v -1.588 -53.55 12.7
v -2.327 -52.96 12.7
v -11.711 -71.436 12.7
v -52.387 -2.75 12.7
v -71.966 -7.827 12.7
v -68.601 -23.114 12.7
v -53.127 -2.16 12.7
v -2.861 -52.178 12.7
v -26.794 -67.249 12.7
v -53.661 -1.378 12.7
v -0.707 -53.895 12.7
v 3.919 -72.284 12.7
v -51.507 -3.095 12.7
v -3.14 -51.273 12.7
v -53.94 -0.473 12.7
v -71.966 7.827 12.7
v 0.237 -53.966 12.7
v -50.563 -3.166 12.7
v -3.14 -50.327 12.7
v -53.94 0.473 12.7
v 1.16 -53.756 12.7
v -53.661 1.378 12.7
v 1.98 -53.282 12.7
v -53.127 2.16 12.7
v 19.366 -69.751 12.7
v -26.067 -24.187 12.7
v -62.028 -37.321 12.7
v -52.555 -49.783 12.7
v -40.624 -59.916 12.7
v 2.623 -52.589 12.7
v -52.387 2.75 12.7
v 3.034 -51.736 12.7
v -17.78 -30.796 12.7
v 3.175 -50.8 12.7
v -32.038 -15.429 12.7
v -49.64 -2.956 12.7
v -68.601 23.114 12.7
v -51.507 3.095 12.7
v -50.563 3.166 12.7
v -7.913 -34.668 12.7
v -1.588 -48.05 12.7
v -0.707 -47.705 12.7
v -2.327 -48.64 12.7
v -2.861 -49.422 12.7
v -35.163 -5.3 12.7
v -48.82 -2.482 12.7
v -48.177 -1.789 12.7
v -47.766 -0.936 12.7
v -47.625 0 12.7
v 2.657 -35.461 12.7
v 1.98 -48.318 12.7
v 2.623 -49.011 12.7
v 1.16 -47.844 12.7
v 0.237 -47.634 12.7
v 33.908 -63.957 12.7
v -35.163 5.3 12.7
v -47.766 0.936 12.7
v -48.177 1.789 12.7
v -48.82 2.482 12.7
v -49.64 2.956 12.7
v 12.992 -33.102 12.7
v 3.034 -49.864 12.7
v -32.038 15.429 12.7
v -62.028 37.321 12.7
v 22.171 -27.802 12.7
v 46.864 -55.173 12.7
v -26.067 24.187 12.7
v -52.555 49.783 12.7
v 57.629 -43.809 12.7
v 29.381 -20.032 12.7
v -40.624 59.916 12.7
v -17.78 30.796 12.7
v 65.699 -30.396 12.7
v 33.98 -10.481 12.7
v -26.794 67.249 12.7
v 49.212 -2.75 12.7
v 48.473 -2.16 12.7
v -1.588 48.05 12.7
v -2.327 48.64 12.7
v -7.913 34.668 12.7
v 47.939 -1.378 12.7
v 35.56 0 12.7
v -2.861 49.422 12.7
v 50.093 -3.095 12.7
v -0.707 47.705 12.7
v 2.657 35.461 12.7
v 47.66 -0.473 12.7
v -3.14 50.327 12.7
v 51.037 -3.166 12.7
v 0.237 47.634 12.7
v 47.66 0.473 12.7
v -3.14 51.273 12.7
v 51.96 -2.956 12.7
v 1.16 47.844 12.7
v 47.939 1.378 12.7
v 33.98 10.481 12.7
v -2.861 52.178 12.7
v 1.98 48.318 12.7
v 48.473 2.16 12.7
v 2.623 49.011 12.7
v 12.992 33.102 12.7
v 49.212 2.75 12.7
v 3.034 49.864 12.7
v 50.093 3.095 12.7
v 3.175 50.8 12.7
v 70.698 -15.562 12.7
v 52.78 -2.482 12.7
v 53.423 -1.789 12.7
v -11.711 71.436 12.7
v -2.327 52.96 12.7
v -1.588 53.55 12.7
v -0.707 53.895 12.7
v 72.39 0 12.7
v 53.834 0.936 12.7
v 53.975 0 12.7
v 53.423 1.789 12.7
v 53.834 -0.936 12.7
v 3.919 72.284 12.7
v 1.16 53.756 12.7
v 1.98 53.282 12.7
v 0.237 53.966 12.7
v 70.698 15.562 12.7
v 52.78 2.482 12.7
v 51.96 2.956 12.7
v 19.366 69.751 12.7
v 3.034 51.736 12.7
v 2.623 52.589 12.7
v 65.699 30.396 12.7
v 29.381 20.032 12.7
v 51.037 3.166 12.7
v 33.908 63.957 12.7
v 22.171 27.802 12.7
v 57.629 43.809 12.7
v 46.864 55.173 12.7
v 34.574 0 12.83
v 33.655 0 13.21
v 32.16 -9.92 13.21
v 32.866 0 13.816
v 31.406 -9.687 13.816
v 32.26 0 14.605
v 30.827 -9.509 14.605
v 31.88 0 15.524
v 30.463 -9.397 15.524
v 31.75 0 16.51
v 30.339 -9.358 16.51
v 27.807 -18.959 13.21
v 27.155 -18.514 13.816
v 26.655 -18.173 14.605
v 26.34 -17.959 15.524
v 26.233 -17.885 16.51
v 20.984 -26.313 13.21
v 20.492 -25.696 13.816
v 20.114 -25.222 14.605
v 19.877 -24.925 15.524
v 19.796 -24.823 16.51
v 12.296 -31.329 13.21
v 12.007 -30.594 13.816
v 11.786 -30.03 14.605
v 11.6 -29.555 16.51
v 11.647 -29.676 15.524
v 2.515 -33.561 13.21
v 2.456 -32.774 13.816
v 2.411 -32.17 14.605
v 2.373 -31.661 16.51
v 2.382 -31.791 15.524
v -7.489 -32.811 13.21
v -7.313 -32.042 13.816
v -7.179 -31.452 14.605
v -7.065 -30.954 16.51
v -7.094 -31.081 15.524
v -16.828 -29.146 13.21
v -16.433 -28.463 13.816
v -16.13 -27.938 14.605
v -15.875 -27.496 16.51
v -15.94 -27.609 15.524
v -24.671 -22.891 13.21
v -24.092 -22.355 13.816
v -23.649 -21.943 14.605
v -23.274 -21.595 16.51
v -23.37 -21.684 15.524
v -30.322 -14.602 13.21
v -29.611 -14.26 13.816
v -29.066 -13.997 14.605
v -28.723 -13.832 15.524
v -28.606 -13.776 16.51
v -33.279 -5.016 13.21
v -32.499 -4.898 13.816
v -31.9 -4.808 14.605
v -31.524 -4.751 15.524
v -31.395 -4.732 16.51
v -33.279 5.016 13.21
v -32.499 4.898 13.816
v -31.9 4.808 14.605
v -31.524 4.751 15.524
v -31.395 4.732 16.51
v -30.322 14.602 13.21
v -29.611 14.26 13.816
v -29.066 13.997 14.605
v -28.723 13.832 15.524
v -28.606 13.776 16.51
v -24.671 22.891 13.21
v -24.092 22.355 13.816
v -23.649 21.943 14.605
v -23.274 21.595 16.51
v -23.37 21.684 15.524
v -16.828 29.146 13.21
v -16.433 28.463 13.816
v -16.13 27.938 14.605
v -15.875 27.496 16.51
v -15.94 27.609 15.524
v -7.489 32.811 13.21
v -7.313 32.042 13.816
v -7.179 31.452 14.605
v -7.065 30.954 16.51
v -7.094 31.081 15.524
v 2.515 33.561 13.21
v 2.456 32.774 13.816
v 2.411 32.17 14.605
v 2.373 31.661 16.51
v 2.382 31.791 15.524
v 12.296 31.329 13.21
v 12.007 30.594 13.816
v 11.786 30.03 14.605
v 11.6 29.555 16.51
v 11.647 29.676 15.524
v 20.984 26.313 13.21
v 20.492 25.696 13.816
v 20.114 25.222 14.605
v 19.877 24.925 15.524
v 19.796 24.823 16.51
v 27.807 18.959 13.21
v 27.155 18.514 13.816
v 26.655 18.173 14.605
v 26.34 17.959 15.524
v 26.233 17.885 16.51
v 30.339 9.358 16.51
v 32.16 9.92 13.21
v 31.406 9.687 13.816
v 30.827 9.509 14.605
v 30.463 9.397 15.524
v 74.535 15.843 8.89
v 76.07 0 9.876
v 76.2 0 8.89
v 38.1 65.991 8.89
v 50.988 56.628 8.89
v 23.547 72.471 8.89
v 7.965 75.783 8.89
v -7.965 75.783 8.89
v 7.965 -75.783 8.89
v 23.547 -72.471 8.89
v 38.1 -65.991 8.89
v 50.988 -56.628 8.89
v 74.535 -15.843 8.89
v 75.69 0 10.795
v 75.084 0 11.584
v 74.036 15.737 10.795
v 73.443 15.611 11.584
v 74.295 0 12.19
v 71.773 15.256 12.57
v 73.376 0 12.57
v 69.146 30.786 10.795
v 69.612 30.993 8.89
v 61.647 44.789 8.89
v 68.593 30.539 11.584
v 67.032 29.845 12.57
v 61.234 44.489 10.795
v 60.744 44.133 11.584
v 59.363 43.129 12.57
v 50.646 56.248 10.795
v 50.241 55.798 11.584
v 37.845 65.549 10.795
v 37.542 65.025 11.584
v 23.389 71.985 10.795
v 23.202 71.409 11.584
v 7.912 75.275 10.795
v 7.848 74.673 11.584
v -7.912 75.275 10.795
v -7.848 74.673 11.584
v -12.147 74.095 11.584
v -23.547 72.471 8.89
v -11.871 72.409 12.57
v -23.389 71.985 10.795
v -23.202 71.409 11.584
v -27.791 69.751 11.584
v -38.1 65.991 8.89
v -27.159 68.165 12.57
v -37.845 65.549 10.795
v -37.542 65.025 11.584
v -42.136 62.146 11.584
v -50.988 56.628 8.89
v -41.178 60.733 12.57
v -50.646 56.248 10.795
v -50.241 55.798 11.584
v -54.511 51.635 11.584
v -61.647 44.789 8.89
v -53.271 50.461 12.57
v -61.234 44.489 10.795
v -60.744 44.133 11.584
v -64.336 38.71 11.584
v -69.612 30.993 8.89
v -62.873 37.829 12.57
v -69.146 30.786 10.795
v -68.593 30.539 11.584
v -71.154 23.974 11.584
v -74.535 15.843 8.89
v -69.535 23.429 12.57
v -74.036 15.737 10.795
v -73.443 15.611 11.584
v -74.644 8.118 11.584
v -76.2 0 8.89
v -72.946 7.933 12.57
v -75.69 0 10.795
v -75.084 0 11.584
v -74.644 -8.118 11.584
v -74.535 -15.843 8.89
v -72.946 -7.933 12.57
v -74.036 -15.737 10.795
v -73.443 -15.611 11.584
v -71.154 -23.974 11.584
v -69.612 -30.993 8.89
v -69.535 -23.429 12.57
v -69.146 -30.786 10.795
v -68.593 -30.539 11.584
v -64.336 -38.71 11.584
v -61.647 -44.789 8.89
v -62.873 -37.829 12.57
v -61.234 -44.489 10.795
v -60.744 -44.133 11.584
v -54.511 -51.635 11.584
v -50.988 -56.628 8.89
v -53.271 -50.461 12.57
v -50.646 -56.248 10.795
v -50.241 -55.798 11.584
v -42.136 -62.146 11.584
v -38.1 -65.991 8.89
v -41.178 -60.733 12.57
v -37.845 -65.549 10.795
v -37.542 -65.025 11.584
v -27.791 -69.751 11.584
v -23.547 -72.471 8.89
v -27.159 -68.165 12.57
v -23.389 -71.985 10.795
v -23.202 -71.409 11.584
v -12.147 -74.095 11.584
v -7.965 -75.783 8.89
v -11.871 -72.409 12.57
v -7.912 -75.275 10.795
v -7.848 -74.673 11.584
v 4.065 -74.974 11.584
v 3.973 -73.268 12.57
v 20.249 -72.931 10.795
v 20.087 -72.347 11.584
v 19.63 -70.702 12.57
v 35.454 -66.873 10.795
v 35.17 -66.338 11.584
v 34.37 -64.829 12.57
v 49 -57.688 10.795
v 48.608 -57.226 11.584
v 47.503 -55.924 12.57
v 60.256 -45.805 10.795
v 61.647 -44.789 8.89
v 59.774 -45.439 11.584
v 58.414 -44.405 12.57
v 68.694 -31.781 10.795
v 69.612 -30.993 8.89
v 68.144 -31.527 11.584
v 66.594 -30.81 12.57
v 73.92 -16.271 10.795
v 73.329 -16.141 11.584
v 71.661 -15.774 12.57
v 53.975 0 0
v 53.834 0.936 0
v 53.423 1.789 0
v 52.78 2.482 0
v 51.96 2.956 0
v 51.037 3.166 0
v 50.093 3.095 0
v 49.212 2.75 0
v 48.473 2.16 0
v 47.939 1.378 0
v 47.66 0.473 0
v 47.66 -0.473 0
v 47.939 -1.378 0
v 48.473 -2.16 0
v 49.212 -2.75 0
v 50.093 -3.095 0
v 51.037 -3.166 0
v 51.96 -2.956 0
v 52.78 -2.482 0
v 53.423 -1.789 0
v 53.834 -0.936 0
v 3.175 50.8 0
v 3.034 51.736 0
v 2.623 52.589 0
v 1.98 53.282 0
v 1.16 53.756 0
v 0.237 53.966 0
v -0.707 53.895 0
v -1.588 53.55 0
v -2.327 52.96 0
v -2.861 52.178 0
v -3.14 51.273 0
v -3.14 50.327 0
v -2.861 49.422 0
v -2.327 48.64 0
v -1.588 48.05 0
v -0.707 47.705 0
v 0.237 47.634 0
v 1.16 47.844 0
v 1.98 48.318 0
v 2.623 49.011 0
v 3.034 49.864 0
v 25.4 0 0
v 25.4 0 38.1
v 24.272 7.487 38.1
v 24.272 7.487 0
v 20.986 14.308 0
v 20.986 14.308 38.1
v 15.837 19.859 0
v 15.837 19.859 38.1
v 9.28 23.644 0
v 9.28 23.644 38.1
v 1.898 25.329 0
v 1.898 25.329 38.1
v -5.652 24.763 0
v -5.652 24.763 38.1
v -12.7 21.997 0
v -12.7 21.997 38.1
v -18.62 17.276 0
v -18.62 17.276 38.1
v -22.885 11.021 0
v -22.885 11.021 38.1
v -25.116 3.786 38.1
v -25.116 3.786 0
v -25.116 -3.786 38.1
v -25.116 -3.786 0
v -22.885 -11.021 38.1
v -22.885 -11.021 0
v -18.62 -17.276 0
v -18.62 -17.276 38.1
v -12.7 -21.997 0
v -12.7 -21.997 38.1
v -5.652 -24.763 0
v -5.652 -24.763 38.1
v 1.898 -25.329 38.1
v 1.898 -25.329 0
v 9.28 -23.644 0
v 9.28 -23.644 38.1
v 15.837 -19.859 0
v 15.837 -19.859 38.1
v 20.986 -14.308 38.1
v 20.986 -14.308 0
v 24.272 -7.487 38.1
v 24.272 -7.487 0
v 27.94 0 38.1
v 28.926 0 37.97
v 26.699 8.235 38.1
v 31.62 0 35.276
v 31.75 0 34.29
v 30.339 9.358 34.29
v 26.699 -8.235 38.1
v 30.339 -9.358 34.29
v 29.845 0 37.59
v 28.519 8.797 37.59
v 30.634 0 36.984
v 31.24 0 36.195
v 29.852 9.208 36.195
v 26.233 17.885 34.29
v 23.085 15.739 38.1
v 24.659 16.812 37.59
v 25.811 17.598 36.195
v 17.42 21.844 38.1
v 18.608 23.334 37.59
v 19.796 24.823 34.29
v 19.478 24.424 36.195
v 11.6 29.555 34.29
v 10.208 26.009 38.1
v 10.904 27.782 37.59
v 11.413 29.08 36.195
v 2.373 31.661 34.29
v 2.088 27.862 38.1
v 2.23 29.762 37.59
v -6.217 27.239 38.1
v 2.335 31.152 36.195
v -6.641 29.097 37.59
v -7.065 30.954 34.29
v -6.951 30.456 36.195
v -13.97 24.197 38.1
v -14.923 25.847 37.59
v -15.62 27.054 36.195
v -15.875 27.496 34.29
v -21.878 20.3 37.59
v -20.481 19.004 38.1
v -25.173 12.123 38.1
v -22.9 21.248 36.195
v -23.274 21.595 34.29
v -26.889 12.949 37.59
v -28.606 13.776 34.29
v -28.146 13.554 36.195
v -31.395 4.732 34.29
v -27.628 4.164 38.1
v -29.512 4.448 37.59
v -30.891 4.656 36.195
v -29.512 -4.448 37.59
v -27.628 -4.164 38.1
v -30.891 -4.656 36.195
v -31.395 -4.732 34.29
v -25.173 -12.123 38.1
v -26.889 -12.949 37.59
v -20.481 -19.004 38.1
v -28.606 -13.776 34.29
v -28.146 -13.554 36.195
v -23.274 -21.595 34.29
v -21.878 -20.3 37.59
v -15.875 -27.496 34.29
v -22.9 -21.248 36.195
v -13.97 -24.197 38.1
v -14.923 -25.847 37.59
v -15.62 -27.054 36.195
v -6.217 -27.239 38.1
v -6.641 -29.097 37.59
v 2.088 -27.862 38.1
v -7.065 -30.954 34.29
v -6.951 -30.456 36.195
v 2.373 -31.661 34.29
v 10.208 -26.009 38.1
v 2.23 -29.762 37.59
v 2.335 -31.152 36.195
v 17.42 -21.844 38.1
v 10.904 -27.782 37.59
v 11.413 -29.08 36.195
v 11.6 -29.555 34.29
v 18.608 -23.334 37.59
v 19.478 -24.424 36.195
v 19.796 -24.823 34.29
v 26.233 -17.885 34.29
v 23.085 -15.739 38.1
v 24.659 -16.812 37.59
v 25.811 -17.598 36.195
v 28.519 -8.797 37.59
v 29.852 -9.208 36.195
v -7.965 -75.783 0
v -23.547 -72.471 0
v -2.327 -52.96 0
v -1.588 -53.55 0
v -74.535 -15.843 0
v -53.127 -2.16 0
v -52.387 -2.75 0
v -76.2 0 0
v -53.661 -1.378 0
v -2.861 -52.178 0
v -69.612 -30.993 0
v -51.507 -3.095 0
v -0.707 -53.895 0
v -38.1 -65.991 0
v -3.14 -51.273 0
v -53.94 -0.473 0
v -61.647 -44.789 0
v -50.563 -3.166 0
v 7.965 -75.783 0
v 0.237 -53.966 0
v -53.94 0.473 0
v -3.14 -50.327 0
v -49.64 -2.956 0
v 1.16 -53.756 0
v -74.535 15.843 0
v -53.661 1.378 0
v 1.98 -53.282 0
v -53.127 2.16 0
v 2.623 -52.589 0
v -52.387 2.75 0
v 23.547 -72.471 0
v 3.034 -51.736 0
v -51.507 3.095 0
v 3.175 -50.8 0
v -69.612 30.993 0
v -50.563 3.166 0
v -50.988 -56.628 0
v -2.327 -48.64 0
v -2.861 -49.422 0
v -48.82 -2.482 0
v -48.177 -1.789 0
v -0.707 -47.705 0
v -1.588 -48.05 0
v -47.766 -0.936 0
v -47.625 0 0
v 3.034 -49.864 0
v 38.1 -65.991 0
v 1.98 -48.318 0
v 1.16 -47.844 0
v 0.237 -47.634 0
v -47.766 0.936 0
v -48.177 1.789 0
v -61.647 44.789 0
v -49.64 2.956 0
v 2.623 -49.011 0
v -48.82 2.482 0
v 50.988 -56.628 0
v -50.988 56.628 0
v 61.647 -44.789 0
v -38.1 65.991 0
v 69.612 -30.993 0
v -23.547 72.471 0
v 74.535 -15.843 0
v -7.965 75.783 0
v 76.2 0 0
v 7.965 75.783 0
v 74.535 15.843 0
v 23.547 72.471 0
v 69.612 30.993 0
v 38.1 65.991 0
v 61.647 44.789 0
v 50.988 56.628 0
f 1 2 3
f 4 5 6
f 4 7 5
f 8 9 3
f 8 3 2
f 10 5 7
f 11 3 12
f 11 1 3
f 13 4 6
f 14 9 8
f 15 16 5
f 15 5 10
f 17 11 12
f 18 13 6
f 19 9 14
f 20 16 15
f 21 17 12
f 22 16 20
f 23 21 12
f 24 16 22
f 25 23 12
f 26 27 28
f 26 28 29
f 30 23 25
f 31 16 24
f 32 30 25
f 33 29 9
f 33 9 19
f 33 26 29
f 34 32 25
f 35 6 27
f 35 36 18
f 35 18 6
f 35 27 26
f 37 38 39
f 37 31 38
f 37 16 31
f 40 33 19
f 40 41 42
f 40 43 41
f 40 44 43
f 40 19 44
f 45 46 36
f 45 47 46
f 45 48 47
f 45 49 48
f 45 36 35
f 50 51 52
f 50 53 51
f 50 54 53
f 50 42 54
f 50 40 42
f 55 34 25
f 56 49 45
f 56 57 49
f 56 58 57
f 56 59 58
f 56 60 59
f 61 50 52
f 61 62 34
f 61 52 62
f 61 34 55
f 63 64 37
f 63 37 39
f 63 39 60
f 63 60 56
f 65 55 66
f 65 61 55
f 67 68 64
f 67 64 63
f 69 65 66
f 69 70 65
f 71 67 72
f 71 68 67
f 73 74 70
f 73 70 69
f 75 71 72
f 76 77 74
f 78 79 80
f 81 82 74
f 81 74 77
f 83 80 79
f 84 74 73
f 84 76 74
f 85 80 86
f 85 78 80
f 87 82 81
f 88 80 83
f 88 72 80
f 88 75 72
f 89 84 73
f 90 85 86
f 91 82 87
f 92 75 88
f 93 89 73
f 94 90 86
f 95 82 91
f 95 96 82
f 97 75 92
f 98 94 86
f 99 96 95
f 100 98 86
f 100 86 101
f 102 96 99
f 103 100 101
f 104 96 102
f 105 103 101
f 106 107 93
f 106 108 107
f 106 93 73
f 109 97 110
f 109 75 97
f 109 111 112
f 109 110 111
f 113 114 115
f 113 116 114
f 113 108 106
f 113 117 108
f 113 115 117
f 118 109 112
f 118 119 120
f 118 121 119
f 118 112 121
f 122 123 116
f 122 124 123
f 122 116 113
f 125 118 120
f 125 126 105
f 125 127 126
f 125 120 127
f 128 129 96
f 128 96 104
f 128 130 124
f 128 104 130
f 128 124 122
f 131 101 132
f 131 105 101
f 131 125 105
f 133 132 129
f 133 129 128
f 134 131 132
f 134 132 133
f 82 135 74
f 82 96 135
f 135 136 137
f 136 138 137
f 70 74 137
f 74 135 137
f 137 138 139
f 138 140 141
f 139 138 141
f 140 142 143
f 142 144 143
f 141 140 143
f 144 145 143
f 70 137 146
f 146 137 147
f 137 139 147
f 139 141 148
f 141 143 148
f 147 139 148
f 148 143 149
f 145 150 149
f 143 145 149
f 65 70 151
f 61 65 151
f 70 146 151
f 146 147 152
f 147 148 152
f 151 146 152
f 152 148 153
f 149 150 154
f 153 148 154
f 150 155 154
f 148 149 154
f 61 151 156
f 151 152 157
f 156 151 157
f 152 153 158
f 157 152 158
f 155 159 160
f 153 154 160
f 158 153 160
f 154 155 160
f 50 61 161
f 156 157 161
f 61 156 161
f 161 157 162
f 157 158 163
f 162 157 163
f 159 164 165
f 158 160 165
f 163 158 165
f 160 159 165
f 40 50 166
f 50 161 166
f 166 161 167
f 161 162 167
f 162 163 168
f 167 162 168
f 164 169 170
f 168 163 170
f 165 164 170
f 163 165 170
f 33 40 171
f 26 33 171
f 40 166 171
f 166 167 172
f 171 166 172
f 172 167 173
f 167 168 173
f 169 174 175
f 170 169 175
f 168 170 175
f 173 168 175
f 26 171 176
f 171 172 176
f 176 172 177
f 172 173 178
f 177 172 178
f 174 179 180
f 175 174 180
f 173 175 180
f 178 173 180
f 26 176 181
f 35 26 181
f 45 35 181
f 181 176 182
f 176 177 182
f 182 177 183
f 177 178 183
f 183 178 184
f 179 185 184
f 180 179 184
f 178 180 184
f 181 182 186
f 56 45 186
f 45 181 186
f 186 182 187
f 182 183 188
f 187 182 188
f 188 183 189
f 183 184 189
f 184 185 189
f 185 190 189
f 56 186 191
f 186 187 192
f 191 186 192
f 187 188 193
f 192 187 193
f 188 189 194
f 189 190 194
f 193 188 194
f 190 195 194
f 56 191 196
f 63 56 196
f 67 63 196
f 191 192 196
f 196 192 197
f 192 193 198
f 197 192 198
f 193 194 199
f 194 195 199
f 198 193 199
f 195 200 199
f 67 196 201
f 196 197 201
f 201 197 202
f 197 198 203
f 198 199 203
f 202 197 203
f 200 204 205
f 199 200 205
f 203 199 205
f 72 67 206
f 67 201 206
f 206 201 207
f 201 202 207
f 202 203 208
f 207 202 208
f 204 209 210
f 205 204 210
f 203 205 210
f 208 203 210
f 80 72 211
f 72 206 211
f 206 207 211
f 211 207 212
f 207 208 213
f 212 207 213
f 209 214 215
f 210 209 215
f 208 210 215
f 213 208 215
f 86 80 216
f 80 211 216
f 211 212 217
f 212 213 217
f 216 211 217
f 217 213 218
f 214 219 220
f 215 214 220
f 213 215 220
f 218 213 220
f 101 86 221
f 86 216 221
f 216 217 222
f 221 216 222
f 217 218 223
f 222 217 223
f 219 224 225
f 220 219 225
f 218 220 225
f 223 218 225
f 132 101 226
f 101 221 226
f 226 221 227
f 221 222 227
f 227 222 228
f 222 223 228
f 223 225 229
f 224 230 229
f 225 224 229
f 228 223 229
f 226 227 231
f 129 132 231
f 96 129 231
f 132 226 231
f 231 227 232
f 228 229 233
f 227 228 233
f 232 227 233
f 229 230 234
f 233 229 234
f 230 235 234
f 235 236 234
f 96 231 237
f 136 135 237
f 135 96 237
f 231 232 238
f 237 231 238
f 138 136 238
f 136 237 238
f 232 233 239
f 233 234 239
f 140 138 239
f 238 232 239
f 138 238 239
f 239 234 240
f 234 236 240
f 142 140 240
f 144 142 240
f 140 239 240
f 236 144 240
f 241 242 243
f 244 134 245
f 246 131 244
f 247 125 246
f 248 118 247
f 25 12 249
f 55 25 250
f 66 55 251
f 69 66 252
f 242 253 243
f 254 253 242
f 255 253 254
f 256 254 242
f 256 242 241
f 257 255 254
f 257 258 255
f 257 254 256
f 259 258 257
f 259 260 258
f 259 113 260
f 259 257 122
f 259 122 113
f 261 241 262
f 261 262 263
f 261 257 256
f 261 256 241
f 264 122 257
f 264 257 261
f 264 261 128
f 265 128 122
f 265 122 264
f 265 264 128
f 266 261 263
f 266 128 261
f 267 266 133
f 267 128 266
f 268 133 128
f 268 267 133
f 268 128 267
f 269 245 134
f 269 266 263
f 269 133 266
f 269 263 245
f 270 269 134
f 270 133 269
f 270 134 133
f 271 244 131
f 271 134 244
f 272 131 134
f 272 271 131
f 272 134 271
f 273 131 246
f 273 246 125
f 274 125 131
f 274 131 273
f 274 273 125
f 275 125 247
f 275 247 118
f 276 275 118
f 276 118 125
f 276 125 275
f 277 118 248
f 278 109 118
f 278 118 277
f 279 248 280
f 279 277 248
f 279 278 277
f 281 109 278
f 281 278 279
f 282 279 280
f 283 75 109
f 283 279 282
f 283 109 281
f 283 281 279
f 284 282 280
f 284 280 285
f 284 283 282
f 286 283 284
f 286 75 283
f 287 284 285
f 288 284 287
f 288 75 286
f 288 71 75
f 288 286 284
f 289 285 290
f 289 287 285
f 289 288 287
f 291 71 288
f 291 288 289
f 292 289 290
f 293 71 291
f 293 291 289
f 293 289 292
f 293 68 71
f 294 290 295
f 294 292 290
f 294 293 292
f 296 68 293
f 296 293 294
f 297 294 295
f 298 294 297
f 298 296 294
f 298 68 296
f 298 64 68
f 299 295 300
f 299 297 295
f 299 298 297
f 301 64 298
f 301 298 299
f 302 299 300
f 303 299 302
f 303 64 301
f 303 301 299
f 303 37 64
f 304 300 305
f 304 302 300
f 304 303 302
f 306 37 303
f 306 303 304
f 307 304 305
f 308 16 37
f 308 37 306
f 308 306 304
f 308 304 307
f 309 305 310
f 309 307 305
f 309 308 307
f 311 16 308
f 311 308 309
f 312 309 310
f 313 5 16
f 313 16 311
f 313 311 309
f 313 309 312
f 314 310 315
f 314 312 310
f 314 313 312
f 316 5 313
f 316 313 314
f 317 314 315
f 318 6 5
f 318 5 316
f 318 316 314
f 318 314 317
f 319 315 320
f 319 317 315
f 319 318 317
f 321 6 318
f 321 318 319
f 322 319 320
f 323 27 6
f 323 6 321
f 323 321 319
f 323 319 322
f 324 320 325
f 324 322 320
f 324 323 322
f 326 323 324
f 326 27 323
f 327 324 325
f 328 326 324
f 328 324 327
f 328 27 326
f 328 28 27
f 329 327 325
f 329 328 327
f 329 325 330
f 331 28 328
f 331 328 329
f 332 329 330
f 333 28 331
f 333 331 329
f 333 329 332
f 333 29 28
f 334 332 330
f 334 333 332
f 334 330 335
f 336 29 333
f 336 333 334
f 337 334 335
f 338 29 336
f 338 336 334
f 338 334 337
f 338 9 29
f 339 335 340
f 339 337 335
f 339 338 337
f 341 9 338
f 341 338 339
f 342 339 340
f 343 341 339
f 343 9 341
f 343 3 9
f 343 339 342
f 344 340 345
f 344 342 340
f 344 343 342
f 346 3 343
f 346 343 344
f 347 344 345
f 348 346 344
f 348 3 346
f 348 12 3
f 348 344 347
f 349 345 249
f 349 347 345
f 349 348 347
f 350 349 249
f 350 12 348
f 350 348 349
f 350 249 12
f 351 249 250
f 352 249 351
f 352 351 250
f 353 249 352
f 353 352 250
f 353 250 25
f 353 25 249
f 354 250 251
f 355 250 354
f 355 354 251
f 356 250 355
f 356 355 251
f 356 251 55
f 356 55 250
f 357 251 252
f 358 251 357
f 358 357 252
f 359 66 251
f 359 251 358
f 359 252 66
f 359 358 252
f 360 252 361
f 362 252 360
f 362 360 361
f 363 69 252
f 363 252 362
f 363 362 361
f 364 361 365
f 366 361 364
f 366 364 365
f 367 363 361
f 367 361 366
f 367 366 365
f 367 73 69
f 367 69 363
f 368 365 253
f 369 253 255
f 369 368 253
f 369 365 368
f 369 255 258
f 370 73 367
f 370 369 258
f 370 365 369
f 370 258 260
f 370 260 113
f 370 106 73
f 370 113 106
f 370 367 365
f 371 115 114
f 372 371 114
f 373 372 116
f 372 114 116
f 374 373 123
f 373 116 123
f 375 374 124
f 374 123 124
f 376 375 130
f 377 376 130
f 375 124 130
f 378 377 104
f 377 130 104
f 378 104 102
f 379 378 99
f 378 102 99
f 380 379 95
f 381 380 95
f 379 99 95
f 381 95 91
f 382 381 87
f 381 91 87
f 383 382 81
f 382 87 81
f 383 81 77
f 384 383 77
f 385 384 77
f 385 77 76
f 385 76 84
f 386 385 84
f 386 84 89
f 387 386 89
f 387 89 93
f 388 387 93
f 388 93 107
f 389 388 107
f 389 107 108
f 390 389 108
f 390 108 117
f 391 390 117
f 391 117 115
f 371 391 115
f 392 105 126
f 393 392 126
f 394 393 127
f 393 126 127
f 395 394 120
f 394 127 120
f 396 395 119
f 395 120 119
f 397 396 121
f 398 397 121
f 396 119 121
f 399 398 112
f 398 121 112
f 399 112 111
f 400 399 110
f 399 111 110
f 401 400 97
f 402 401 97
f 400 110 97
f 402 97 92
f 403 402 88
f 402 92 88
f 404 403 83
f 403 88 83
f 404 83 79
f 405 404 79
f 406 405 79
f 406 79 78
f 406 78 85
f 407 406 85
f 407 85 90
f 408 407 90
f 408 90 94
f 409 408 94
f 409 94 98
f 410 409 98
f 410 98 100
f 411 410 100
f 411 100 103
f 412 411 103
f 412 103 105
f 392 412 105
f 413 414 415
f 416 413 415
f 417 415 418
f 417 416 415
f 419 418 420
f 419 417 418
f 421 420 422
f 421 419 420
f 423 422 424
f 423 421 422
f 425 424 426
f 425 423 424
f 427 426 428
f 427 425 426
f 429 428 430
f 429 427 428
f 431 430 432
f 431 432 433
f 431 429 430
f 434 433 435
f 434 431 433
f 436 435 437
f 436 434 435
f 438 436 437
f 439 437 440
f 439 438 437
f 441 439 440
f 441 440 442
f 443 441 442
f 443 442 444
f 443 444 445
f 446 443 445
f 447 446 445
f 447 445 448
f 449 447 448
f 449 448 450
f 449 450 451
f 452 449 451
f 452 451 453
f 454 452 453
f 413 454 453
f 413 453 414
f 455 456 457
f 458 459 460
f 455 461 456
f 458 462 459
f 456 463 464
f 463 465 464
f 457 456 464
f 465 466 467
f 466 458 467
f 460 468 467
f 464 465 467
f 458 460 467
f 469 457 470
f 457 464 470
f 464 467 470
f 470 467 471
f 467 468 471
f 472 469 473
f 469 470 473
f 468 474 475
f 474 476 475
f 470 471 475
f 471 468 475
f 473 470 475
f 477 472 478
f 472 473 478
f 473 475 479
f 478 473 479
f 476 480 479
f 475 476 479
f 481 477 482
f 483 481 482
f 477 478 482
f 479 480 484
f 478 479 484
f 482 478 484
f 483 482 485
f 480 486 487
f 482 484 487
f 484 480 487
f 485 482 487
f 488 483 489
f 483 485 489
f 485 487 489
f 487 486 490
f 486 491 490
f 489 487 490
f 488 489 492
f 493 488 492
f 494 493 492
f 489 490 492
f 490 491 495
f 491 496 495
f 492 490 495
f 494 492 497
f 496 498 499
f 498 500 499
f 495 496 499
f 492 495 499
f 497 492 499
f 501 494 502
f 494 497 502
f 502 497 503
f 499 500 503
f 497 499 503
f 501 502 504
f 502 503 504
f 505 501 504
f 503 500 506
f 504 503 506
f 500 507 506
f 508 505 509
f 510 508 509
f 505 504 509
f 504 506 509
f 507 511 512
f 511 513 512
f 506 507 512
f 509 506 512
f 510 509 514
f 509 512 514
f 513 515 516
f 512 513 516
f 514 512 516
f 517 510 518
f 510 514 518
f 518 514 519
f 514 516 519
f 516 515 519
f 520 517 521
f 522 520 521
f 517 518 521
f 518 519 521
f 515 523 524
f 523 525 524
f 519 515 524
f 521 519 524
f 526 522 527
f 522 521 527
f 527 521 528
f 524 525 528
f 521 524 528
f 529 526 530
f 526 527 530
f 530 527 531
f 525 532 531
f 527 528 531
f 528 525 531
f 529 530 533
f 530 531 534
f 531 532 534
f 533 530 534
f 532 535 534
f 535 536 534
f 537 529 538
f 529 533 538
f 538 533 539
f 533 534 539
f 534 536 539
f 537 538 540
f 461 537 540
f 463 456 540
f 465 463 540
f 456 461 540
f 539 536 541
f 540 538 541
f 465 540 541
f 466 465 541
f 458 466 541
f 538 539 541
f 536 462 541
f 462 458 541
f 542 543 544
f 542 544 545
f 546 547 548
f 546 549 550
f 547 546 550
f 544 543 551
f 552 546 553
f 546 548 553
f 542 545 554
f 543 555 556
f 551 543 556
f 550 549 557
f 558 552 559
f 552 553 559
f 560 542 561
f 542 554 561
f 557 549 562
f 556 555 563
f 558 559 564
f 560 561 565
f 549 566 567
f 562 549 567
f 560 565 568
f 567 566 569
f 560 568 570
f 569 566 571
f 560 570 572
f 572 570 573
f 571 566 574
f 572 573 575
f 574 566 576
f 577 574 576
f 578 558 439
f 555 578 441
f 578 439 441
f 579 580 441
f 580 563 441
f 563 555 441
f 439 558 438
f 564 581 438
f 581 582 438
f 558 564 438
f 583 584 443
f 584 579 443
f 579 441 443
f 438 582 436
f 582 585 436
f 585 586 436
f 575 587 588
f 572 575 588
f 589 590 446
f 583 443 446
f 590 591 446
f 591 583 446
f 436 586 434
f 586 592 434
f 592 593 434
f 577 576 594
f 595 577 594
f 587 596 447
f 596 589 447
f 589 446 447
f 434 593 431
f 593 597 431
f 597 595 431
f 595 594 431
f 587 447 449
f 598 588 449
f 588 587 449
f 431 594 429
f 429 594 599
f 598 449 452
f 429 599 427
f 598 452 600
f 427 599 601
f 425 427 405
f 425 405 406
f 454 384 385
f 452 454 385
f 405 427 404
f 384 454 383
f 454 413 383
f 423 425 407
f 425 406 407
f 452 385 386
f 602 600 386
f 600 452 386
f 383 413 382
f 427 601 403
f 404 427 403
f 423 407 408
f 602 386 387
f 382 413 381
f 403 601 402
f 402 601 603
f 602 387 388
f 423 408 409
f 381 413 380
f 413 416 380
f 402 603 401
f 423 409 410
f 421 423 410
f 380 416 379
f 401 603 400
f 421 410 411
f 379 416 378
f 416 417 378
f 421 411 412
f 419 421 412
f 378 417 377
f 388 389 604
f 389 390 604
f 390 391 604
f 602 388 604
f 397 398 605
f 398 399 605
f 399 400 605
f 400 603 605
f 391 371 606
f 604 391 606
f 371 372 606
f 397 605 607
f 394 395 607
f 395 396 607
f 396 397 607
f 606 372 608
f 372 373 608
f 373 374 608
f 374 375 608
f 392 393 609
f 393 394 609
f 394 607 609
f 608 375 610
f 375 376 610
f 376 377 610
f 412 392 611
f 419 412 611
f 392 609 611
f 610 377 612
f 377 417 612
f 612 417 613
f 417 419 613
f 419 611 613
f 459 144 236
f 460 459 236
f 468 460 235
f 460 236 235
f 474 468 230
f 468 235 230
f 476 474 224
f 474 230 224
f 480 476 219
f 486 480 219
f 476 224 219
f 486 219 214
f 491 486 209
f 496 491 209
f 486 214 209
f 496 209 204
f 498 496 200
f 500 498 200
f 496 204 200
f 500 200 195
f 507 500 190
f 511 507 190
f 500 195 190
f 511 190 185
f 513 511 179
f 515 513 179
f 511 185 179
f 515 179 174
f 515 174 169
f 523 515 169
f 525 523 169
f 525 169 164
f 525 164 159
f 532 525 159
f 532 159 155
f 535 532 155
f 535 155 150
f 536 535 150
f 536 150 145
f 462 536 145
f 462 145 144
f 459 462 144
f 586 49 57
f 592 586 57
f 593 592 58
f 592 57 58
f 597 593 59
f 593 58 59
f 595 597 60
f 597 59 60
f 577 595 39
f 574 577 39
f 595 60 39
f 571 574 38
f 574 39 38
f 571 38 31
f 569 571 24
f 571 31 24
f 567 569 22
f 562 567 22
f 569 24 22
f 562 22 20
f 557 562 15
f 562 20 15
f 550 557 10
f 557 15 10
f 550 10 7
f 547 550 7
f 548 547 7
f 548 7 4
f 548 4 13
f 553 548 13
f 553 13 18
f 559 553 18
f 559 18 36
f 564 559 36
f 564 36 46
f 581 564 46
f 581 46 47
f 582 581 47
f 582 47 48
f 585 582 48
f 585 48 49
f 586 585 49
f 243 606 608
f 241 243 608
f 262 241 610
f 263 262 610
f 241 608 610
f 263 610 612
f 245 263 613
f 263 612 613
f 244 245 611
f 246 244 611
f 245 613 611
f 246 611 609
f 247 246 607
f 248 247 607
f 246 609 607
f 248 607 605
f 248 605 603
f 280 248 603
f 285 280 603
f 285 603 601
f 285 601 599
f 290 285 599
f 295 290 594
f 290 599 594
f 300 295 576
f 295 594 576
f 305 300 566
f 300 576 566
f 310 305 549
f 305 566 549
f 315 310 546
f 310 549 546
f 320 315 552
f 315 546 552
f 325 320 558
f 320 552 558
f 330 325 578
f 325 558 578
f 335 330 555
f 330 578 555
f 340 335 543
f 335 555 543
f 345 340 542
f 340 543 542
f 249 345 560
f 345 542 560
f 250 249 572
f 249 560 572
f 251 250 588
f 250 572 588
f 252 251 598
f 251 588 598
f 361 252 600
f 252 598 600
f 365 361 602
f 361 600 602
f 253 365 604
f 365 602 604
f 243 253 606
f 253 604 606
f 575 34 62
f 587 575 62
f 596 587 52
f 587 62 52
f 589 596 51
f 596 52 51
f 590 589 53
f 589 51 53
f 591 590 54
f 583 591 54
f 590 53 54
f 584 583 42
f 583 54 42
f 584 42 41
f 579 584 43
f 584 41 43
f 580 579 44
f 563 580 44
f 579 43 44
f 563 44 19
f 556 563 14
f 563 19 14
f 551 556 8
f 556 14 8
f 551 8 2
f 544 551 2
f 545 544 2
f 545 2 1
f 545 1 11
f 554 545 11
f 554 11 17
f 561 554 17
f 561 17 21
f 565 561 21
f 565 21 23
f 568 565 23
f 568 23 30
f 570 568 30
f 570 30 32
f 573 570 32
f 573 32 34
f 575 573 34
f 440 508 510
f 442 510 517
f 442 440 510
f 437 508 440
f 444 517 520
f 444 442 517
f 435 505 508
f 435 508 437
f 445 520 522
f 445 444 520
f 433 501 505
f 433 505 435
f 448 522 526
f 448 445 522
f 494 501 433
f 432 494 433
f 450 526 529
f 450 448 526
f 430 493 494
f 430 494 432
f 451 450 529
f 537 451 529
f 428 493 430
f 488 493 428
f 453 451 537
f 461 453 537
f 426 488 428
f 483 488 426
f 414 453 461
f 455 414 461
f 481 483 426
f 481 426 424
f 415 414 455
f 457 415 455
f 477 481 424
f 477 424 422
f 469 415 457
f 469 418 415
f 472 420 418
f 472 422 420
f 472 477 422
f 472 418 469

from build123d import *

# Parameters (mm, degrees)
F0_R     = 76.2
F0_R_2   = 25.4
F1_DEPTH = 12.7
F2_R     = 31.75
F2_R_2   = 25.4
F3_DEPTH = 38.1
F4_R     = 3.175
F5_DEPTH = 12.701
F6_R     = 3.81


with BuildPart() as f1:
    # F0 (on Top) → F1 (new body)
    with BuildSketch(Plane.XY):
        Circle(F0_R)
        Circle(F0_R_2, mode=Mode.SUBTRACT)
    extrude(amount=F1_DEPTH)

    # F2 (on Top) → F3 (join)
    with BuildSketch(Plane.XY):
        Circle(F2_R)
        Circle(F2_R_2, mode=Mode.SUBTRACT)
    extrude(amount=F3_DEPTH)

    # F4 (on face) → F5 (cut, through all)
    with BuildSketch(Plane.XY.offset(12.7)):
        with Locations((-50.8, 0)):
            Circle(F4_R)
        with Locations((0, -50.8)):
            Circle(F4_R)
        with Locations((50.8, 0)):
            Circle(F4_R)
        with Locations((0, 50.8)):
            Circle(F4_R)
    extrude(amount=-F5_DEPTH, mode=Mode.SUBTRACT)

    # F6
    f6_edges = [f1.edges().sort_by_distance(p)[0] for p in [
        (-76.2, 0, 12.7),
        (-31.75, 0, 38.1),
        (-31.75, 0, 12.7),
    ]]
    fillet(f6_edges, radius=F6_R)


solid = f1.part
